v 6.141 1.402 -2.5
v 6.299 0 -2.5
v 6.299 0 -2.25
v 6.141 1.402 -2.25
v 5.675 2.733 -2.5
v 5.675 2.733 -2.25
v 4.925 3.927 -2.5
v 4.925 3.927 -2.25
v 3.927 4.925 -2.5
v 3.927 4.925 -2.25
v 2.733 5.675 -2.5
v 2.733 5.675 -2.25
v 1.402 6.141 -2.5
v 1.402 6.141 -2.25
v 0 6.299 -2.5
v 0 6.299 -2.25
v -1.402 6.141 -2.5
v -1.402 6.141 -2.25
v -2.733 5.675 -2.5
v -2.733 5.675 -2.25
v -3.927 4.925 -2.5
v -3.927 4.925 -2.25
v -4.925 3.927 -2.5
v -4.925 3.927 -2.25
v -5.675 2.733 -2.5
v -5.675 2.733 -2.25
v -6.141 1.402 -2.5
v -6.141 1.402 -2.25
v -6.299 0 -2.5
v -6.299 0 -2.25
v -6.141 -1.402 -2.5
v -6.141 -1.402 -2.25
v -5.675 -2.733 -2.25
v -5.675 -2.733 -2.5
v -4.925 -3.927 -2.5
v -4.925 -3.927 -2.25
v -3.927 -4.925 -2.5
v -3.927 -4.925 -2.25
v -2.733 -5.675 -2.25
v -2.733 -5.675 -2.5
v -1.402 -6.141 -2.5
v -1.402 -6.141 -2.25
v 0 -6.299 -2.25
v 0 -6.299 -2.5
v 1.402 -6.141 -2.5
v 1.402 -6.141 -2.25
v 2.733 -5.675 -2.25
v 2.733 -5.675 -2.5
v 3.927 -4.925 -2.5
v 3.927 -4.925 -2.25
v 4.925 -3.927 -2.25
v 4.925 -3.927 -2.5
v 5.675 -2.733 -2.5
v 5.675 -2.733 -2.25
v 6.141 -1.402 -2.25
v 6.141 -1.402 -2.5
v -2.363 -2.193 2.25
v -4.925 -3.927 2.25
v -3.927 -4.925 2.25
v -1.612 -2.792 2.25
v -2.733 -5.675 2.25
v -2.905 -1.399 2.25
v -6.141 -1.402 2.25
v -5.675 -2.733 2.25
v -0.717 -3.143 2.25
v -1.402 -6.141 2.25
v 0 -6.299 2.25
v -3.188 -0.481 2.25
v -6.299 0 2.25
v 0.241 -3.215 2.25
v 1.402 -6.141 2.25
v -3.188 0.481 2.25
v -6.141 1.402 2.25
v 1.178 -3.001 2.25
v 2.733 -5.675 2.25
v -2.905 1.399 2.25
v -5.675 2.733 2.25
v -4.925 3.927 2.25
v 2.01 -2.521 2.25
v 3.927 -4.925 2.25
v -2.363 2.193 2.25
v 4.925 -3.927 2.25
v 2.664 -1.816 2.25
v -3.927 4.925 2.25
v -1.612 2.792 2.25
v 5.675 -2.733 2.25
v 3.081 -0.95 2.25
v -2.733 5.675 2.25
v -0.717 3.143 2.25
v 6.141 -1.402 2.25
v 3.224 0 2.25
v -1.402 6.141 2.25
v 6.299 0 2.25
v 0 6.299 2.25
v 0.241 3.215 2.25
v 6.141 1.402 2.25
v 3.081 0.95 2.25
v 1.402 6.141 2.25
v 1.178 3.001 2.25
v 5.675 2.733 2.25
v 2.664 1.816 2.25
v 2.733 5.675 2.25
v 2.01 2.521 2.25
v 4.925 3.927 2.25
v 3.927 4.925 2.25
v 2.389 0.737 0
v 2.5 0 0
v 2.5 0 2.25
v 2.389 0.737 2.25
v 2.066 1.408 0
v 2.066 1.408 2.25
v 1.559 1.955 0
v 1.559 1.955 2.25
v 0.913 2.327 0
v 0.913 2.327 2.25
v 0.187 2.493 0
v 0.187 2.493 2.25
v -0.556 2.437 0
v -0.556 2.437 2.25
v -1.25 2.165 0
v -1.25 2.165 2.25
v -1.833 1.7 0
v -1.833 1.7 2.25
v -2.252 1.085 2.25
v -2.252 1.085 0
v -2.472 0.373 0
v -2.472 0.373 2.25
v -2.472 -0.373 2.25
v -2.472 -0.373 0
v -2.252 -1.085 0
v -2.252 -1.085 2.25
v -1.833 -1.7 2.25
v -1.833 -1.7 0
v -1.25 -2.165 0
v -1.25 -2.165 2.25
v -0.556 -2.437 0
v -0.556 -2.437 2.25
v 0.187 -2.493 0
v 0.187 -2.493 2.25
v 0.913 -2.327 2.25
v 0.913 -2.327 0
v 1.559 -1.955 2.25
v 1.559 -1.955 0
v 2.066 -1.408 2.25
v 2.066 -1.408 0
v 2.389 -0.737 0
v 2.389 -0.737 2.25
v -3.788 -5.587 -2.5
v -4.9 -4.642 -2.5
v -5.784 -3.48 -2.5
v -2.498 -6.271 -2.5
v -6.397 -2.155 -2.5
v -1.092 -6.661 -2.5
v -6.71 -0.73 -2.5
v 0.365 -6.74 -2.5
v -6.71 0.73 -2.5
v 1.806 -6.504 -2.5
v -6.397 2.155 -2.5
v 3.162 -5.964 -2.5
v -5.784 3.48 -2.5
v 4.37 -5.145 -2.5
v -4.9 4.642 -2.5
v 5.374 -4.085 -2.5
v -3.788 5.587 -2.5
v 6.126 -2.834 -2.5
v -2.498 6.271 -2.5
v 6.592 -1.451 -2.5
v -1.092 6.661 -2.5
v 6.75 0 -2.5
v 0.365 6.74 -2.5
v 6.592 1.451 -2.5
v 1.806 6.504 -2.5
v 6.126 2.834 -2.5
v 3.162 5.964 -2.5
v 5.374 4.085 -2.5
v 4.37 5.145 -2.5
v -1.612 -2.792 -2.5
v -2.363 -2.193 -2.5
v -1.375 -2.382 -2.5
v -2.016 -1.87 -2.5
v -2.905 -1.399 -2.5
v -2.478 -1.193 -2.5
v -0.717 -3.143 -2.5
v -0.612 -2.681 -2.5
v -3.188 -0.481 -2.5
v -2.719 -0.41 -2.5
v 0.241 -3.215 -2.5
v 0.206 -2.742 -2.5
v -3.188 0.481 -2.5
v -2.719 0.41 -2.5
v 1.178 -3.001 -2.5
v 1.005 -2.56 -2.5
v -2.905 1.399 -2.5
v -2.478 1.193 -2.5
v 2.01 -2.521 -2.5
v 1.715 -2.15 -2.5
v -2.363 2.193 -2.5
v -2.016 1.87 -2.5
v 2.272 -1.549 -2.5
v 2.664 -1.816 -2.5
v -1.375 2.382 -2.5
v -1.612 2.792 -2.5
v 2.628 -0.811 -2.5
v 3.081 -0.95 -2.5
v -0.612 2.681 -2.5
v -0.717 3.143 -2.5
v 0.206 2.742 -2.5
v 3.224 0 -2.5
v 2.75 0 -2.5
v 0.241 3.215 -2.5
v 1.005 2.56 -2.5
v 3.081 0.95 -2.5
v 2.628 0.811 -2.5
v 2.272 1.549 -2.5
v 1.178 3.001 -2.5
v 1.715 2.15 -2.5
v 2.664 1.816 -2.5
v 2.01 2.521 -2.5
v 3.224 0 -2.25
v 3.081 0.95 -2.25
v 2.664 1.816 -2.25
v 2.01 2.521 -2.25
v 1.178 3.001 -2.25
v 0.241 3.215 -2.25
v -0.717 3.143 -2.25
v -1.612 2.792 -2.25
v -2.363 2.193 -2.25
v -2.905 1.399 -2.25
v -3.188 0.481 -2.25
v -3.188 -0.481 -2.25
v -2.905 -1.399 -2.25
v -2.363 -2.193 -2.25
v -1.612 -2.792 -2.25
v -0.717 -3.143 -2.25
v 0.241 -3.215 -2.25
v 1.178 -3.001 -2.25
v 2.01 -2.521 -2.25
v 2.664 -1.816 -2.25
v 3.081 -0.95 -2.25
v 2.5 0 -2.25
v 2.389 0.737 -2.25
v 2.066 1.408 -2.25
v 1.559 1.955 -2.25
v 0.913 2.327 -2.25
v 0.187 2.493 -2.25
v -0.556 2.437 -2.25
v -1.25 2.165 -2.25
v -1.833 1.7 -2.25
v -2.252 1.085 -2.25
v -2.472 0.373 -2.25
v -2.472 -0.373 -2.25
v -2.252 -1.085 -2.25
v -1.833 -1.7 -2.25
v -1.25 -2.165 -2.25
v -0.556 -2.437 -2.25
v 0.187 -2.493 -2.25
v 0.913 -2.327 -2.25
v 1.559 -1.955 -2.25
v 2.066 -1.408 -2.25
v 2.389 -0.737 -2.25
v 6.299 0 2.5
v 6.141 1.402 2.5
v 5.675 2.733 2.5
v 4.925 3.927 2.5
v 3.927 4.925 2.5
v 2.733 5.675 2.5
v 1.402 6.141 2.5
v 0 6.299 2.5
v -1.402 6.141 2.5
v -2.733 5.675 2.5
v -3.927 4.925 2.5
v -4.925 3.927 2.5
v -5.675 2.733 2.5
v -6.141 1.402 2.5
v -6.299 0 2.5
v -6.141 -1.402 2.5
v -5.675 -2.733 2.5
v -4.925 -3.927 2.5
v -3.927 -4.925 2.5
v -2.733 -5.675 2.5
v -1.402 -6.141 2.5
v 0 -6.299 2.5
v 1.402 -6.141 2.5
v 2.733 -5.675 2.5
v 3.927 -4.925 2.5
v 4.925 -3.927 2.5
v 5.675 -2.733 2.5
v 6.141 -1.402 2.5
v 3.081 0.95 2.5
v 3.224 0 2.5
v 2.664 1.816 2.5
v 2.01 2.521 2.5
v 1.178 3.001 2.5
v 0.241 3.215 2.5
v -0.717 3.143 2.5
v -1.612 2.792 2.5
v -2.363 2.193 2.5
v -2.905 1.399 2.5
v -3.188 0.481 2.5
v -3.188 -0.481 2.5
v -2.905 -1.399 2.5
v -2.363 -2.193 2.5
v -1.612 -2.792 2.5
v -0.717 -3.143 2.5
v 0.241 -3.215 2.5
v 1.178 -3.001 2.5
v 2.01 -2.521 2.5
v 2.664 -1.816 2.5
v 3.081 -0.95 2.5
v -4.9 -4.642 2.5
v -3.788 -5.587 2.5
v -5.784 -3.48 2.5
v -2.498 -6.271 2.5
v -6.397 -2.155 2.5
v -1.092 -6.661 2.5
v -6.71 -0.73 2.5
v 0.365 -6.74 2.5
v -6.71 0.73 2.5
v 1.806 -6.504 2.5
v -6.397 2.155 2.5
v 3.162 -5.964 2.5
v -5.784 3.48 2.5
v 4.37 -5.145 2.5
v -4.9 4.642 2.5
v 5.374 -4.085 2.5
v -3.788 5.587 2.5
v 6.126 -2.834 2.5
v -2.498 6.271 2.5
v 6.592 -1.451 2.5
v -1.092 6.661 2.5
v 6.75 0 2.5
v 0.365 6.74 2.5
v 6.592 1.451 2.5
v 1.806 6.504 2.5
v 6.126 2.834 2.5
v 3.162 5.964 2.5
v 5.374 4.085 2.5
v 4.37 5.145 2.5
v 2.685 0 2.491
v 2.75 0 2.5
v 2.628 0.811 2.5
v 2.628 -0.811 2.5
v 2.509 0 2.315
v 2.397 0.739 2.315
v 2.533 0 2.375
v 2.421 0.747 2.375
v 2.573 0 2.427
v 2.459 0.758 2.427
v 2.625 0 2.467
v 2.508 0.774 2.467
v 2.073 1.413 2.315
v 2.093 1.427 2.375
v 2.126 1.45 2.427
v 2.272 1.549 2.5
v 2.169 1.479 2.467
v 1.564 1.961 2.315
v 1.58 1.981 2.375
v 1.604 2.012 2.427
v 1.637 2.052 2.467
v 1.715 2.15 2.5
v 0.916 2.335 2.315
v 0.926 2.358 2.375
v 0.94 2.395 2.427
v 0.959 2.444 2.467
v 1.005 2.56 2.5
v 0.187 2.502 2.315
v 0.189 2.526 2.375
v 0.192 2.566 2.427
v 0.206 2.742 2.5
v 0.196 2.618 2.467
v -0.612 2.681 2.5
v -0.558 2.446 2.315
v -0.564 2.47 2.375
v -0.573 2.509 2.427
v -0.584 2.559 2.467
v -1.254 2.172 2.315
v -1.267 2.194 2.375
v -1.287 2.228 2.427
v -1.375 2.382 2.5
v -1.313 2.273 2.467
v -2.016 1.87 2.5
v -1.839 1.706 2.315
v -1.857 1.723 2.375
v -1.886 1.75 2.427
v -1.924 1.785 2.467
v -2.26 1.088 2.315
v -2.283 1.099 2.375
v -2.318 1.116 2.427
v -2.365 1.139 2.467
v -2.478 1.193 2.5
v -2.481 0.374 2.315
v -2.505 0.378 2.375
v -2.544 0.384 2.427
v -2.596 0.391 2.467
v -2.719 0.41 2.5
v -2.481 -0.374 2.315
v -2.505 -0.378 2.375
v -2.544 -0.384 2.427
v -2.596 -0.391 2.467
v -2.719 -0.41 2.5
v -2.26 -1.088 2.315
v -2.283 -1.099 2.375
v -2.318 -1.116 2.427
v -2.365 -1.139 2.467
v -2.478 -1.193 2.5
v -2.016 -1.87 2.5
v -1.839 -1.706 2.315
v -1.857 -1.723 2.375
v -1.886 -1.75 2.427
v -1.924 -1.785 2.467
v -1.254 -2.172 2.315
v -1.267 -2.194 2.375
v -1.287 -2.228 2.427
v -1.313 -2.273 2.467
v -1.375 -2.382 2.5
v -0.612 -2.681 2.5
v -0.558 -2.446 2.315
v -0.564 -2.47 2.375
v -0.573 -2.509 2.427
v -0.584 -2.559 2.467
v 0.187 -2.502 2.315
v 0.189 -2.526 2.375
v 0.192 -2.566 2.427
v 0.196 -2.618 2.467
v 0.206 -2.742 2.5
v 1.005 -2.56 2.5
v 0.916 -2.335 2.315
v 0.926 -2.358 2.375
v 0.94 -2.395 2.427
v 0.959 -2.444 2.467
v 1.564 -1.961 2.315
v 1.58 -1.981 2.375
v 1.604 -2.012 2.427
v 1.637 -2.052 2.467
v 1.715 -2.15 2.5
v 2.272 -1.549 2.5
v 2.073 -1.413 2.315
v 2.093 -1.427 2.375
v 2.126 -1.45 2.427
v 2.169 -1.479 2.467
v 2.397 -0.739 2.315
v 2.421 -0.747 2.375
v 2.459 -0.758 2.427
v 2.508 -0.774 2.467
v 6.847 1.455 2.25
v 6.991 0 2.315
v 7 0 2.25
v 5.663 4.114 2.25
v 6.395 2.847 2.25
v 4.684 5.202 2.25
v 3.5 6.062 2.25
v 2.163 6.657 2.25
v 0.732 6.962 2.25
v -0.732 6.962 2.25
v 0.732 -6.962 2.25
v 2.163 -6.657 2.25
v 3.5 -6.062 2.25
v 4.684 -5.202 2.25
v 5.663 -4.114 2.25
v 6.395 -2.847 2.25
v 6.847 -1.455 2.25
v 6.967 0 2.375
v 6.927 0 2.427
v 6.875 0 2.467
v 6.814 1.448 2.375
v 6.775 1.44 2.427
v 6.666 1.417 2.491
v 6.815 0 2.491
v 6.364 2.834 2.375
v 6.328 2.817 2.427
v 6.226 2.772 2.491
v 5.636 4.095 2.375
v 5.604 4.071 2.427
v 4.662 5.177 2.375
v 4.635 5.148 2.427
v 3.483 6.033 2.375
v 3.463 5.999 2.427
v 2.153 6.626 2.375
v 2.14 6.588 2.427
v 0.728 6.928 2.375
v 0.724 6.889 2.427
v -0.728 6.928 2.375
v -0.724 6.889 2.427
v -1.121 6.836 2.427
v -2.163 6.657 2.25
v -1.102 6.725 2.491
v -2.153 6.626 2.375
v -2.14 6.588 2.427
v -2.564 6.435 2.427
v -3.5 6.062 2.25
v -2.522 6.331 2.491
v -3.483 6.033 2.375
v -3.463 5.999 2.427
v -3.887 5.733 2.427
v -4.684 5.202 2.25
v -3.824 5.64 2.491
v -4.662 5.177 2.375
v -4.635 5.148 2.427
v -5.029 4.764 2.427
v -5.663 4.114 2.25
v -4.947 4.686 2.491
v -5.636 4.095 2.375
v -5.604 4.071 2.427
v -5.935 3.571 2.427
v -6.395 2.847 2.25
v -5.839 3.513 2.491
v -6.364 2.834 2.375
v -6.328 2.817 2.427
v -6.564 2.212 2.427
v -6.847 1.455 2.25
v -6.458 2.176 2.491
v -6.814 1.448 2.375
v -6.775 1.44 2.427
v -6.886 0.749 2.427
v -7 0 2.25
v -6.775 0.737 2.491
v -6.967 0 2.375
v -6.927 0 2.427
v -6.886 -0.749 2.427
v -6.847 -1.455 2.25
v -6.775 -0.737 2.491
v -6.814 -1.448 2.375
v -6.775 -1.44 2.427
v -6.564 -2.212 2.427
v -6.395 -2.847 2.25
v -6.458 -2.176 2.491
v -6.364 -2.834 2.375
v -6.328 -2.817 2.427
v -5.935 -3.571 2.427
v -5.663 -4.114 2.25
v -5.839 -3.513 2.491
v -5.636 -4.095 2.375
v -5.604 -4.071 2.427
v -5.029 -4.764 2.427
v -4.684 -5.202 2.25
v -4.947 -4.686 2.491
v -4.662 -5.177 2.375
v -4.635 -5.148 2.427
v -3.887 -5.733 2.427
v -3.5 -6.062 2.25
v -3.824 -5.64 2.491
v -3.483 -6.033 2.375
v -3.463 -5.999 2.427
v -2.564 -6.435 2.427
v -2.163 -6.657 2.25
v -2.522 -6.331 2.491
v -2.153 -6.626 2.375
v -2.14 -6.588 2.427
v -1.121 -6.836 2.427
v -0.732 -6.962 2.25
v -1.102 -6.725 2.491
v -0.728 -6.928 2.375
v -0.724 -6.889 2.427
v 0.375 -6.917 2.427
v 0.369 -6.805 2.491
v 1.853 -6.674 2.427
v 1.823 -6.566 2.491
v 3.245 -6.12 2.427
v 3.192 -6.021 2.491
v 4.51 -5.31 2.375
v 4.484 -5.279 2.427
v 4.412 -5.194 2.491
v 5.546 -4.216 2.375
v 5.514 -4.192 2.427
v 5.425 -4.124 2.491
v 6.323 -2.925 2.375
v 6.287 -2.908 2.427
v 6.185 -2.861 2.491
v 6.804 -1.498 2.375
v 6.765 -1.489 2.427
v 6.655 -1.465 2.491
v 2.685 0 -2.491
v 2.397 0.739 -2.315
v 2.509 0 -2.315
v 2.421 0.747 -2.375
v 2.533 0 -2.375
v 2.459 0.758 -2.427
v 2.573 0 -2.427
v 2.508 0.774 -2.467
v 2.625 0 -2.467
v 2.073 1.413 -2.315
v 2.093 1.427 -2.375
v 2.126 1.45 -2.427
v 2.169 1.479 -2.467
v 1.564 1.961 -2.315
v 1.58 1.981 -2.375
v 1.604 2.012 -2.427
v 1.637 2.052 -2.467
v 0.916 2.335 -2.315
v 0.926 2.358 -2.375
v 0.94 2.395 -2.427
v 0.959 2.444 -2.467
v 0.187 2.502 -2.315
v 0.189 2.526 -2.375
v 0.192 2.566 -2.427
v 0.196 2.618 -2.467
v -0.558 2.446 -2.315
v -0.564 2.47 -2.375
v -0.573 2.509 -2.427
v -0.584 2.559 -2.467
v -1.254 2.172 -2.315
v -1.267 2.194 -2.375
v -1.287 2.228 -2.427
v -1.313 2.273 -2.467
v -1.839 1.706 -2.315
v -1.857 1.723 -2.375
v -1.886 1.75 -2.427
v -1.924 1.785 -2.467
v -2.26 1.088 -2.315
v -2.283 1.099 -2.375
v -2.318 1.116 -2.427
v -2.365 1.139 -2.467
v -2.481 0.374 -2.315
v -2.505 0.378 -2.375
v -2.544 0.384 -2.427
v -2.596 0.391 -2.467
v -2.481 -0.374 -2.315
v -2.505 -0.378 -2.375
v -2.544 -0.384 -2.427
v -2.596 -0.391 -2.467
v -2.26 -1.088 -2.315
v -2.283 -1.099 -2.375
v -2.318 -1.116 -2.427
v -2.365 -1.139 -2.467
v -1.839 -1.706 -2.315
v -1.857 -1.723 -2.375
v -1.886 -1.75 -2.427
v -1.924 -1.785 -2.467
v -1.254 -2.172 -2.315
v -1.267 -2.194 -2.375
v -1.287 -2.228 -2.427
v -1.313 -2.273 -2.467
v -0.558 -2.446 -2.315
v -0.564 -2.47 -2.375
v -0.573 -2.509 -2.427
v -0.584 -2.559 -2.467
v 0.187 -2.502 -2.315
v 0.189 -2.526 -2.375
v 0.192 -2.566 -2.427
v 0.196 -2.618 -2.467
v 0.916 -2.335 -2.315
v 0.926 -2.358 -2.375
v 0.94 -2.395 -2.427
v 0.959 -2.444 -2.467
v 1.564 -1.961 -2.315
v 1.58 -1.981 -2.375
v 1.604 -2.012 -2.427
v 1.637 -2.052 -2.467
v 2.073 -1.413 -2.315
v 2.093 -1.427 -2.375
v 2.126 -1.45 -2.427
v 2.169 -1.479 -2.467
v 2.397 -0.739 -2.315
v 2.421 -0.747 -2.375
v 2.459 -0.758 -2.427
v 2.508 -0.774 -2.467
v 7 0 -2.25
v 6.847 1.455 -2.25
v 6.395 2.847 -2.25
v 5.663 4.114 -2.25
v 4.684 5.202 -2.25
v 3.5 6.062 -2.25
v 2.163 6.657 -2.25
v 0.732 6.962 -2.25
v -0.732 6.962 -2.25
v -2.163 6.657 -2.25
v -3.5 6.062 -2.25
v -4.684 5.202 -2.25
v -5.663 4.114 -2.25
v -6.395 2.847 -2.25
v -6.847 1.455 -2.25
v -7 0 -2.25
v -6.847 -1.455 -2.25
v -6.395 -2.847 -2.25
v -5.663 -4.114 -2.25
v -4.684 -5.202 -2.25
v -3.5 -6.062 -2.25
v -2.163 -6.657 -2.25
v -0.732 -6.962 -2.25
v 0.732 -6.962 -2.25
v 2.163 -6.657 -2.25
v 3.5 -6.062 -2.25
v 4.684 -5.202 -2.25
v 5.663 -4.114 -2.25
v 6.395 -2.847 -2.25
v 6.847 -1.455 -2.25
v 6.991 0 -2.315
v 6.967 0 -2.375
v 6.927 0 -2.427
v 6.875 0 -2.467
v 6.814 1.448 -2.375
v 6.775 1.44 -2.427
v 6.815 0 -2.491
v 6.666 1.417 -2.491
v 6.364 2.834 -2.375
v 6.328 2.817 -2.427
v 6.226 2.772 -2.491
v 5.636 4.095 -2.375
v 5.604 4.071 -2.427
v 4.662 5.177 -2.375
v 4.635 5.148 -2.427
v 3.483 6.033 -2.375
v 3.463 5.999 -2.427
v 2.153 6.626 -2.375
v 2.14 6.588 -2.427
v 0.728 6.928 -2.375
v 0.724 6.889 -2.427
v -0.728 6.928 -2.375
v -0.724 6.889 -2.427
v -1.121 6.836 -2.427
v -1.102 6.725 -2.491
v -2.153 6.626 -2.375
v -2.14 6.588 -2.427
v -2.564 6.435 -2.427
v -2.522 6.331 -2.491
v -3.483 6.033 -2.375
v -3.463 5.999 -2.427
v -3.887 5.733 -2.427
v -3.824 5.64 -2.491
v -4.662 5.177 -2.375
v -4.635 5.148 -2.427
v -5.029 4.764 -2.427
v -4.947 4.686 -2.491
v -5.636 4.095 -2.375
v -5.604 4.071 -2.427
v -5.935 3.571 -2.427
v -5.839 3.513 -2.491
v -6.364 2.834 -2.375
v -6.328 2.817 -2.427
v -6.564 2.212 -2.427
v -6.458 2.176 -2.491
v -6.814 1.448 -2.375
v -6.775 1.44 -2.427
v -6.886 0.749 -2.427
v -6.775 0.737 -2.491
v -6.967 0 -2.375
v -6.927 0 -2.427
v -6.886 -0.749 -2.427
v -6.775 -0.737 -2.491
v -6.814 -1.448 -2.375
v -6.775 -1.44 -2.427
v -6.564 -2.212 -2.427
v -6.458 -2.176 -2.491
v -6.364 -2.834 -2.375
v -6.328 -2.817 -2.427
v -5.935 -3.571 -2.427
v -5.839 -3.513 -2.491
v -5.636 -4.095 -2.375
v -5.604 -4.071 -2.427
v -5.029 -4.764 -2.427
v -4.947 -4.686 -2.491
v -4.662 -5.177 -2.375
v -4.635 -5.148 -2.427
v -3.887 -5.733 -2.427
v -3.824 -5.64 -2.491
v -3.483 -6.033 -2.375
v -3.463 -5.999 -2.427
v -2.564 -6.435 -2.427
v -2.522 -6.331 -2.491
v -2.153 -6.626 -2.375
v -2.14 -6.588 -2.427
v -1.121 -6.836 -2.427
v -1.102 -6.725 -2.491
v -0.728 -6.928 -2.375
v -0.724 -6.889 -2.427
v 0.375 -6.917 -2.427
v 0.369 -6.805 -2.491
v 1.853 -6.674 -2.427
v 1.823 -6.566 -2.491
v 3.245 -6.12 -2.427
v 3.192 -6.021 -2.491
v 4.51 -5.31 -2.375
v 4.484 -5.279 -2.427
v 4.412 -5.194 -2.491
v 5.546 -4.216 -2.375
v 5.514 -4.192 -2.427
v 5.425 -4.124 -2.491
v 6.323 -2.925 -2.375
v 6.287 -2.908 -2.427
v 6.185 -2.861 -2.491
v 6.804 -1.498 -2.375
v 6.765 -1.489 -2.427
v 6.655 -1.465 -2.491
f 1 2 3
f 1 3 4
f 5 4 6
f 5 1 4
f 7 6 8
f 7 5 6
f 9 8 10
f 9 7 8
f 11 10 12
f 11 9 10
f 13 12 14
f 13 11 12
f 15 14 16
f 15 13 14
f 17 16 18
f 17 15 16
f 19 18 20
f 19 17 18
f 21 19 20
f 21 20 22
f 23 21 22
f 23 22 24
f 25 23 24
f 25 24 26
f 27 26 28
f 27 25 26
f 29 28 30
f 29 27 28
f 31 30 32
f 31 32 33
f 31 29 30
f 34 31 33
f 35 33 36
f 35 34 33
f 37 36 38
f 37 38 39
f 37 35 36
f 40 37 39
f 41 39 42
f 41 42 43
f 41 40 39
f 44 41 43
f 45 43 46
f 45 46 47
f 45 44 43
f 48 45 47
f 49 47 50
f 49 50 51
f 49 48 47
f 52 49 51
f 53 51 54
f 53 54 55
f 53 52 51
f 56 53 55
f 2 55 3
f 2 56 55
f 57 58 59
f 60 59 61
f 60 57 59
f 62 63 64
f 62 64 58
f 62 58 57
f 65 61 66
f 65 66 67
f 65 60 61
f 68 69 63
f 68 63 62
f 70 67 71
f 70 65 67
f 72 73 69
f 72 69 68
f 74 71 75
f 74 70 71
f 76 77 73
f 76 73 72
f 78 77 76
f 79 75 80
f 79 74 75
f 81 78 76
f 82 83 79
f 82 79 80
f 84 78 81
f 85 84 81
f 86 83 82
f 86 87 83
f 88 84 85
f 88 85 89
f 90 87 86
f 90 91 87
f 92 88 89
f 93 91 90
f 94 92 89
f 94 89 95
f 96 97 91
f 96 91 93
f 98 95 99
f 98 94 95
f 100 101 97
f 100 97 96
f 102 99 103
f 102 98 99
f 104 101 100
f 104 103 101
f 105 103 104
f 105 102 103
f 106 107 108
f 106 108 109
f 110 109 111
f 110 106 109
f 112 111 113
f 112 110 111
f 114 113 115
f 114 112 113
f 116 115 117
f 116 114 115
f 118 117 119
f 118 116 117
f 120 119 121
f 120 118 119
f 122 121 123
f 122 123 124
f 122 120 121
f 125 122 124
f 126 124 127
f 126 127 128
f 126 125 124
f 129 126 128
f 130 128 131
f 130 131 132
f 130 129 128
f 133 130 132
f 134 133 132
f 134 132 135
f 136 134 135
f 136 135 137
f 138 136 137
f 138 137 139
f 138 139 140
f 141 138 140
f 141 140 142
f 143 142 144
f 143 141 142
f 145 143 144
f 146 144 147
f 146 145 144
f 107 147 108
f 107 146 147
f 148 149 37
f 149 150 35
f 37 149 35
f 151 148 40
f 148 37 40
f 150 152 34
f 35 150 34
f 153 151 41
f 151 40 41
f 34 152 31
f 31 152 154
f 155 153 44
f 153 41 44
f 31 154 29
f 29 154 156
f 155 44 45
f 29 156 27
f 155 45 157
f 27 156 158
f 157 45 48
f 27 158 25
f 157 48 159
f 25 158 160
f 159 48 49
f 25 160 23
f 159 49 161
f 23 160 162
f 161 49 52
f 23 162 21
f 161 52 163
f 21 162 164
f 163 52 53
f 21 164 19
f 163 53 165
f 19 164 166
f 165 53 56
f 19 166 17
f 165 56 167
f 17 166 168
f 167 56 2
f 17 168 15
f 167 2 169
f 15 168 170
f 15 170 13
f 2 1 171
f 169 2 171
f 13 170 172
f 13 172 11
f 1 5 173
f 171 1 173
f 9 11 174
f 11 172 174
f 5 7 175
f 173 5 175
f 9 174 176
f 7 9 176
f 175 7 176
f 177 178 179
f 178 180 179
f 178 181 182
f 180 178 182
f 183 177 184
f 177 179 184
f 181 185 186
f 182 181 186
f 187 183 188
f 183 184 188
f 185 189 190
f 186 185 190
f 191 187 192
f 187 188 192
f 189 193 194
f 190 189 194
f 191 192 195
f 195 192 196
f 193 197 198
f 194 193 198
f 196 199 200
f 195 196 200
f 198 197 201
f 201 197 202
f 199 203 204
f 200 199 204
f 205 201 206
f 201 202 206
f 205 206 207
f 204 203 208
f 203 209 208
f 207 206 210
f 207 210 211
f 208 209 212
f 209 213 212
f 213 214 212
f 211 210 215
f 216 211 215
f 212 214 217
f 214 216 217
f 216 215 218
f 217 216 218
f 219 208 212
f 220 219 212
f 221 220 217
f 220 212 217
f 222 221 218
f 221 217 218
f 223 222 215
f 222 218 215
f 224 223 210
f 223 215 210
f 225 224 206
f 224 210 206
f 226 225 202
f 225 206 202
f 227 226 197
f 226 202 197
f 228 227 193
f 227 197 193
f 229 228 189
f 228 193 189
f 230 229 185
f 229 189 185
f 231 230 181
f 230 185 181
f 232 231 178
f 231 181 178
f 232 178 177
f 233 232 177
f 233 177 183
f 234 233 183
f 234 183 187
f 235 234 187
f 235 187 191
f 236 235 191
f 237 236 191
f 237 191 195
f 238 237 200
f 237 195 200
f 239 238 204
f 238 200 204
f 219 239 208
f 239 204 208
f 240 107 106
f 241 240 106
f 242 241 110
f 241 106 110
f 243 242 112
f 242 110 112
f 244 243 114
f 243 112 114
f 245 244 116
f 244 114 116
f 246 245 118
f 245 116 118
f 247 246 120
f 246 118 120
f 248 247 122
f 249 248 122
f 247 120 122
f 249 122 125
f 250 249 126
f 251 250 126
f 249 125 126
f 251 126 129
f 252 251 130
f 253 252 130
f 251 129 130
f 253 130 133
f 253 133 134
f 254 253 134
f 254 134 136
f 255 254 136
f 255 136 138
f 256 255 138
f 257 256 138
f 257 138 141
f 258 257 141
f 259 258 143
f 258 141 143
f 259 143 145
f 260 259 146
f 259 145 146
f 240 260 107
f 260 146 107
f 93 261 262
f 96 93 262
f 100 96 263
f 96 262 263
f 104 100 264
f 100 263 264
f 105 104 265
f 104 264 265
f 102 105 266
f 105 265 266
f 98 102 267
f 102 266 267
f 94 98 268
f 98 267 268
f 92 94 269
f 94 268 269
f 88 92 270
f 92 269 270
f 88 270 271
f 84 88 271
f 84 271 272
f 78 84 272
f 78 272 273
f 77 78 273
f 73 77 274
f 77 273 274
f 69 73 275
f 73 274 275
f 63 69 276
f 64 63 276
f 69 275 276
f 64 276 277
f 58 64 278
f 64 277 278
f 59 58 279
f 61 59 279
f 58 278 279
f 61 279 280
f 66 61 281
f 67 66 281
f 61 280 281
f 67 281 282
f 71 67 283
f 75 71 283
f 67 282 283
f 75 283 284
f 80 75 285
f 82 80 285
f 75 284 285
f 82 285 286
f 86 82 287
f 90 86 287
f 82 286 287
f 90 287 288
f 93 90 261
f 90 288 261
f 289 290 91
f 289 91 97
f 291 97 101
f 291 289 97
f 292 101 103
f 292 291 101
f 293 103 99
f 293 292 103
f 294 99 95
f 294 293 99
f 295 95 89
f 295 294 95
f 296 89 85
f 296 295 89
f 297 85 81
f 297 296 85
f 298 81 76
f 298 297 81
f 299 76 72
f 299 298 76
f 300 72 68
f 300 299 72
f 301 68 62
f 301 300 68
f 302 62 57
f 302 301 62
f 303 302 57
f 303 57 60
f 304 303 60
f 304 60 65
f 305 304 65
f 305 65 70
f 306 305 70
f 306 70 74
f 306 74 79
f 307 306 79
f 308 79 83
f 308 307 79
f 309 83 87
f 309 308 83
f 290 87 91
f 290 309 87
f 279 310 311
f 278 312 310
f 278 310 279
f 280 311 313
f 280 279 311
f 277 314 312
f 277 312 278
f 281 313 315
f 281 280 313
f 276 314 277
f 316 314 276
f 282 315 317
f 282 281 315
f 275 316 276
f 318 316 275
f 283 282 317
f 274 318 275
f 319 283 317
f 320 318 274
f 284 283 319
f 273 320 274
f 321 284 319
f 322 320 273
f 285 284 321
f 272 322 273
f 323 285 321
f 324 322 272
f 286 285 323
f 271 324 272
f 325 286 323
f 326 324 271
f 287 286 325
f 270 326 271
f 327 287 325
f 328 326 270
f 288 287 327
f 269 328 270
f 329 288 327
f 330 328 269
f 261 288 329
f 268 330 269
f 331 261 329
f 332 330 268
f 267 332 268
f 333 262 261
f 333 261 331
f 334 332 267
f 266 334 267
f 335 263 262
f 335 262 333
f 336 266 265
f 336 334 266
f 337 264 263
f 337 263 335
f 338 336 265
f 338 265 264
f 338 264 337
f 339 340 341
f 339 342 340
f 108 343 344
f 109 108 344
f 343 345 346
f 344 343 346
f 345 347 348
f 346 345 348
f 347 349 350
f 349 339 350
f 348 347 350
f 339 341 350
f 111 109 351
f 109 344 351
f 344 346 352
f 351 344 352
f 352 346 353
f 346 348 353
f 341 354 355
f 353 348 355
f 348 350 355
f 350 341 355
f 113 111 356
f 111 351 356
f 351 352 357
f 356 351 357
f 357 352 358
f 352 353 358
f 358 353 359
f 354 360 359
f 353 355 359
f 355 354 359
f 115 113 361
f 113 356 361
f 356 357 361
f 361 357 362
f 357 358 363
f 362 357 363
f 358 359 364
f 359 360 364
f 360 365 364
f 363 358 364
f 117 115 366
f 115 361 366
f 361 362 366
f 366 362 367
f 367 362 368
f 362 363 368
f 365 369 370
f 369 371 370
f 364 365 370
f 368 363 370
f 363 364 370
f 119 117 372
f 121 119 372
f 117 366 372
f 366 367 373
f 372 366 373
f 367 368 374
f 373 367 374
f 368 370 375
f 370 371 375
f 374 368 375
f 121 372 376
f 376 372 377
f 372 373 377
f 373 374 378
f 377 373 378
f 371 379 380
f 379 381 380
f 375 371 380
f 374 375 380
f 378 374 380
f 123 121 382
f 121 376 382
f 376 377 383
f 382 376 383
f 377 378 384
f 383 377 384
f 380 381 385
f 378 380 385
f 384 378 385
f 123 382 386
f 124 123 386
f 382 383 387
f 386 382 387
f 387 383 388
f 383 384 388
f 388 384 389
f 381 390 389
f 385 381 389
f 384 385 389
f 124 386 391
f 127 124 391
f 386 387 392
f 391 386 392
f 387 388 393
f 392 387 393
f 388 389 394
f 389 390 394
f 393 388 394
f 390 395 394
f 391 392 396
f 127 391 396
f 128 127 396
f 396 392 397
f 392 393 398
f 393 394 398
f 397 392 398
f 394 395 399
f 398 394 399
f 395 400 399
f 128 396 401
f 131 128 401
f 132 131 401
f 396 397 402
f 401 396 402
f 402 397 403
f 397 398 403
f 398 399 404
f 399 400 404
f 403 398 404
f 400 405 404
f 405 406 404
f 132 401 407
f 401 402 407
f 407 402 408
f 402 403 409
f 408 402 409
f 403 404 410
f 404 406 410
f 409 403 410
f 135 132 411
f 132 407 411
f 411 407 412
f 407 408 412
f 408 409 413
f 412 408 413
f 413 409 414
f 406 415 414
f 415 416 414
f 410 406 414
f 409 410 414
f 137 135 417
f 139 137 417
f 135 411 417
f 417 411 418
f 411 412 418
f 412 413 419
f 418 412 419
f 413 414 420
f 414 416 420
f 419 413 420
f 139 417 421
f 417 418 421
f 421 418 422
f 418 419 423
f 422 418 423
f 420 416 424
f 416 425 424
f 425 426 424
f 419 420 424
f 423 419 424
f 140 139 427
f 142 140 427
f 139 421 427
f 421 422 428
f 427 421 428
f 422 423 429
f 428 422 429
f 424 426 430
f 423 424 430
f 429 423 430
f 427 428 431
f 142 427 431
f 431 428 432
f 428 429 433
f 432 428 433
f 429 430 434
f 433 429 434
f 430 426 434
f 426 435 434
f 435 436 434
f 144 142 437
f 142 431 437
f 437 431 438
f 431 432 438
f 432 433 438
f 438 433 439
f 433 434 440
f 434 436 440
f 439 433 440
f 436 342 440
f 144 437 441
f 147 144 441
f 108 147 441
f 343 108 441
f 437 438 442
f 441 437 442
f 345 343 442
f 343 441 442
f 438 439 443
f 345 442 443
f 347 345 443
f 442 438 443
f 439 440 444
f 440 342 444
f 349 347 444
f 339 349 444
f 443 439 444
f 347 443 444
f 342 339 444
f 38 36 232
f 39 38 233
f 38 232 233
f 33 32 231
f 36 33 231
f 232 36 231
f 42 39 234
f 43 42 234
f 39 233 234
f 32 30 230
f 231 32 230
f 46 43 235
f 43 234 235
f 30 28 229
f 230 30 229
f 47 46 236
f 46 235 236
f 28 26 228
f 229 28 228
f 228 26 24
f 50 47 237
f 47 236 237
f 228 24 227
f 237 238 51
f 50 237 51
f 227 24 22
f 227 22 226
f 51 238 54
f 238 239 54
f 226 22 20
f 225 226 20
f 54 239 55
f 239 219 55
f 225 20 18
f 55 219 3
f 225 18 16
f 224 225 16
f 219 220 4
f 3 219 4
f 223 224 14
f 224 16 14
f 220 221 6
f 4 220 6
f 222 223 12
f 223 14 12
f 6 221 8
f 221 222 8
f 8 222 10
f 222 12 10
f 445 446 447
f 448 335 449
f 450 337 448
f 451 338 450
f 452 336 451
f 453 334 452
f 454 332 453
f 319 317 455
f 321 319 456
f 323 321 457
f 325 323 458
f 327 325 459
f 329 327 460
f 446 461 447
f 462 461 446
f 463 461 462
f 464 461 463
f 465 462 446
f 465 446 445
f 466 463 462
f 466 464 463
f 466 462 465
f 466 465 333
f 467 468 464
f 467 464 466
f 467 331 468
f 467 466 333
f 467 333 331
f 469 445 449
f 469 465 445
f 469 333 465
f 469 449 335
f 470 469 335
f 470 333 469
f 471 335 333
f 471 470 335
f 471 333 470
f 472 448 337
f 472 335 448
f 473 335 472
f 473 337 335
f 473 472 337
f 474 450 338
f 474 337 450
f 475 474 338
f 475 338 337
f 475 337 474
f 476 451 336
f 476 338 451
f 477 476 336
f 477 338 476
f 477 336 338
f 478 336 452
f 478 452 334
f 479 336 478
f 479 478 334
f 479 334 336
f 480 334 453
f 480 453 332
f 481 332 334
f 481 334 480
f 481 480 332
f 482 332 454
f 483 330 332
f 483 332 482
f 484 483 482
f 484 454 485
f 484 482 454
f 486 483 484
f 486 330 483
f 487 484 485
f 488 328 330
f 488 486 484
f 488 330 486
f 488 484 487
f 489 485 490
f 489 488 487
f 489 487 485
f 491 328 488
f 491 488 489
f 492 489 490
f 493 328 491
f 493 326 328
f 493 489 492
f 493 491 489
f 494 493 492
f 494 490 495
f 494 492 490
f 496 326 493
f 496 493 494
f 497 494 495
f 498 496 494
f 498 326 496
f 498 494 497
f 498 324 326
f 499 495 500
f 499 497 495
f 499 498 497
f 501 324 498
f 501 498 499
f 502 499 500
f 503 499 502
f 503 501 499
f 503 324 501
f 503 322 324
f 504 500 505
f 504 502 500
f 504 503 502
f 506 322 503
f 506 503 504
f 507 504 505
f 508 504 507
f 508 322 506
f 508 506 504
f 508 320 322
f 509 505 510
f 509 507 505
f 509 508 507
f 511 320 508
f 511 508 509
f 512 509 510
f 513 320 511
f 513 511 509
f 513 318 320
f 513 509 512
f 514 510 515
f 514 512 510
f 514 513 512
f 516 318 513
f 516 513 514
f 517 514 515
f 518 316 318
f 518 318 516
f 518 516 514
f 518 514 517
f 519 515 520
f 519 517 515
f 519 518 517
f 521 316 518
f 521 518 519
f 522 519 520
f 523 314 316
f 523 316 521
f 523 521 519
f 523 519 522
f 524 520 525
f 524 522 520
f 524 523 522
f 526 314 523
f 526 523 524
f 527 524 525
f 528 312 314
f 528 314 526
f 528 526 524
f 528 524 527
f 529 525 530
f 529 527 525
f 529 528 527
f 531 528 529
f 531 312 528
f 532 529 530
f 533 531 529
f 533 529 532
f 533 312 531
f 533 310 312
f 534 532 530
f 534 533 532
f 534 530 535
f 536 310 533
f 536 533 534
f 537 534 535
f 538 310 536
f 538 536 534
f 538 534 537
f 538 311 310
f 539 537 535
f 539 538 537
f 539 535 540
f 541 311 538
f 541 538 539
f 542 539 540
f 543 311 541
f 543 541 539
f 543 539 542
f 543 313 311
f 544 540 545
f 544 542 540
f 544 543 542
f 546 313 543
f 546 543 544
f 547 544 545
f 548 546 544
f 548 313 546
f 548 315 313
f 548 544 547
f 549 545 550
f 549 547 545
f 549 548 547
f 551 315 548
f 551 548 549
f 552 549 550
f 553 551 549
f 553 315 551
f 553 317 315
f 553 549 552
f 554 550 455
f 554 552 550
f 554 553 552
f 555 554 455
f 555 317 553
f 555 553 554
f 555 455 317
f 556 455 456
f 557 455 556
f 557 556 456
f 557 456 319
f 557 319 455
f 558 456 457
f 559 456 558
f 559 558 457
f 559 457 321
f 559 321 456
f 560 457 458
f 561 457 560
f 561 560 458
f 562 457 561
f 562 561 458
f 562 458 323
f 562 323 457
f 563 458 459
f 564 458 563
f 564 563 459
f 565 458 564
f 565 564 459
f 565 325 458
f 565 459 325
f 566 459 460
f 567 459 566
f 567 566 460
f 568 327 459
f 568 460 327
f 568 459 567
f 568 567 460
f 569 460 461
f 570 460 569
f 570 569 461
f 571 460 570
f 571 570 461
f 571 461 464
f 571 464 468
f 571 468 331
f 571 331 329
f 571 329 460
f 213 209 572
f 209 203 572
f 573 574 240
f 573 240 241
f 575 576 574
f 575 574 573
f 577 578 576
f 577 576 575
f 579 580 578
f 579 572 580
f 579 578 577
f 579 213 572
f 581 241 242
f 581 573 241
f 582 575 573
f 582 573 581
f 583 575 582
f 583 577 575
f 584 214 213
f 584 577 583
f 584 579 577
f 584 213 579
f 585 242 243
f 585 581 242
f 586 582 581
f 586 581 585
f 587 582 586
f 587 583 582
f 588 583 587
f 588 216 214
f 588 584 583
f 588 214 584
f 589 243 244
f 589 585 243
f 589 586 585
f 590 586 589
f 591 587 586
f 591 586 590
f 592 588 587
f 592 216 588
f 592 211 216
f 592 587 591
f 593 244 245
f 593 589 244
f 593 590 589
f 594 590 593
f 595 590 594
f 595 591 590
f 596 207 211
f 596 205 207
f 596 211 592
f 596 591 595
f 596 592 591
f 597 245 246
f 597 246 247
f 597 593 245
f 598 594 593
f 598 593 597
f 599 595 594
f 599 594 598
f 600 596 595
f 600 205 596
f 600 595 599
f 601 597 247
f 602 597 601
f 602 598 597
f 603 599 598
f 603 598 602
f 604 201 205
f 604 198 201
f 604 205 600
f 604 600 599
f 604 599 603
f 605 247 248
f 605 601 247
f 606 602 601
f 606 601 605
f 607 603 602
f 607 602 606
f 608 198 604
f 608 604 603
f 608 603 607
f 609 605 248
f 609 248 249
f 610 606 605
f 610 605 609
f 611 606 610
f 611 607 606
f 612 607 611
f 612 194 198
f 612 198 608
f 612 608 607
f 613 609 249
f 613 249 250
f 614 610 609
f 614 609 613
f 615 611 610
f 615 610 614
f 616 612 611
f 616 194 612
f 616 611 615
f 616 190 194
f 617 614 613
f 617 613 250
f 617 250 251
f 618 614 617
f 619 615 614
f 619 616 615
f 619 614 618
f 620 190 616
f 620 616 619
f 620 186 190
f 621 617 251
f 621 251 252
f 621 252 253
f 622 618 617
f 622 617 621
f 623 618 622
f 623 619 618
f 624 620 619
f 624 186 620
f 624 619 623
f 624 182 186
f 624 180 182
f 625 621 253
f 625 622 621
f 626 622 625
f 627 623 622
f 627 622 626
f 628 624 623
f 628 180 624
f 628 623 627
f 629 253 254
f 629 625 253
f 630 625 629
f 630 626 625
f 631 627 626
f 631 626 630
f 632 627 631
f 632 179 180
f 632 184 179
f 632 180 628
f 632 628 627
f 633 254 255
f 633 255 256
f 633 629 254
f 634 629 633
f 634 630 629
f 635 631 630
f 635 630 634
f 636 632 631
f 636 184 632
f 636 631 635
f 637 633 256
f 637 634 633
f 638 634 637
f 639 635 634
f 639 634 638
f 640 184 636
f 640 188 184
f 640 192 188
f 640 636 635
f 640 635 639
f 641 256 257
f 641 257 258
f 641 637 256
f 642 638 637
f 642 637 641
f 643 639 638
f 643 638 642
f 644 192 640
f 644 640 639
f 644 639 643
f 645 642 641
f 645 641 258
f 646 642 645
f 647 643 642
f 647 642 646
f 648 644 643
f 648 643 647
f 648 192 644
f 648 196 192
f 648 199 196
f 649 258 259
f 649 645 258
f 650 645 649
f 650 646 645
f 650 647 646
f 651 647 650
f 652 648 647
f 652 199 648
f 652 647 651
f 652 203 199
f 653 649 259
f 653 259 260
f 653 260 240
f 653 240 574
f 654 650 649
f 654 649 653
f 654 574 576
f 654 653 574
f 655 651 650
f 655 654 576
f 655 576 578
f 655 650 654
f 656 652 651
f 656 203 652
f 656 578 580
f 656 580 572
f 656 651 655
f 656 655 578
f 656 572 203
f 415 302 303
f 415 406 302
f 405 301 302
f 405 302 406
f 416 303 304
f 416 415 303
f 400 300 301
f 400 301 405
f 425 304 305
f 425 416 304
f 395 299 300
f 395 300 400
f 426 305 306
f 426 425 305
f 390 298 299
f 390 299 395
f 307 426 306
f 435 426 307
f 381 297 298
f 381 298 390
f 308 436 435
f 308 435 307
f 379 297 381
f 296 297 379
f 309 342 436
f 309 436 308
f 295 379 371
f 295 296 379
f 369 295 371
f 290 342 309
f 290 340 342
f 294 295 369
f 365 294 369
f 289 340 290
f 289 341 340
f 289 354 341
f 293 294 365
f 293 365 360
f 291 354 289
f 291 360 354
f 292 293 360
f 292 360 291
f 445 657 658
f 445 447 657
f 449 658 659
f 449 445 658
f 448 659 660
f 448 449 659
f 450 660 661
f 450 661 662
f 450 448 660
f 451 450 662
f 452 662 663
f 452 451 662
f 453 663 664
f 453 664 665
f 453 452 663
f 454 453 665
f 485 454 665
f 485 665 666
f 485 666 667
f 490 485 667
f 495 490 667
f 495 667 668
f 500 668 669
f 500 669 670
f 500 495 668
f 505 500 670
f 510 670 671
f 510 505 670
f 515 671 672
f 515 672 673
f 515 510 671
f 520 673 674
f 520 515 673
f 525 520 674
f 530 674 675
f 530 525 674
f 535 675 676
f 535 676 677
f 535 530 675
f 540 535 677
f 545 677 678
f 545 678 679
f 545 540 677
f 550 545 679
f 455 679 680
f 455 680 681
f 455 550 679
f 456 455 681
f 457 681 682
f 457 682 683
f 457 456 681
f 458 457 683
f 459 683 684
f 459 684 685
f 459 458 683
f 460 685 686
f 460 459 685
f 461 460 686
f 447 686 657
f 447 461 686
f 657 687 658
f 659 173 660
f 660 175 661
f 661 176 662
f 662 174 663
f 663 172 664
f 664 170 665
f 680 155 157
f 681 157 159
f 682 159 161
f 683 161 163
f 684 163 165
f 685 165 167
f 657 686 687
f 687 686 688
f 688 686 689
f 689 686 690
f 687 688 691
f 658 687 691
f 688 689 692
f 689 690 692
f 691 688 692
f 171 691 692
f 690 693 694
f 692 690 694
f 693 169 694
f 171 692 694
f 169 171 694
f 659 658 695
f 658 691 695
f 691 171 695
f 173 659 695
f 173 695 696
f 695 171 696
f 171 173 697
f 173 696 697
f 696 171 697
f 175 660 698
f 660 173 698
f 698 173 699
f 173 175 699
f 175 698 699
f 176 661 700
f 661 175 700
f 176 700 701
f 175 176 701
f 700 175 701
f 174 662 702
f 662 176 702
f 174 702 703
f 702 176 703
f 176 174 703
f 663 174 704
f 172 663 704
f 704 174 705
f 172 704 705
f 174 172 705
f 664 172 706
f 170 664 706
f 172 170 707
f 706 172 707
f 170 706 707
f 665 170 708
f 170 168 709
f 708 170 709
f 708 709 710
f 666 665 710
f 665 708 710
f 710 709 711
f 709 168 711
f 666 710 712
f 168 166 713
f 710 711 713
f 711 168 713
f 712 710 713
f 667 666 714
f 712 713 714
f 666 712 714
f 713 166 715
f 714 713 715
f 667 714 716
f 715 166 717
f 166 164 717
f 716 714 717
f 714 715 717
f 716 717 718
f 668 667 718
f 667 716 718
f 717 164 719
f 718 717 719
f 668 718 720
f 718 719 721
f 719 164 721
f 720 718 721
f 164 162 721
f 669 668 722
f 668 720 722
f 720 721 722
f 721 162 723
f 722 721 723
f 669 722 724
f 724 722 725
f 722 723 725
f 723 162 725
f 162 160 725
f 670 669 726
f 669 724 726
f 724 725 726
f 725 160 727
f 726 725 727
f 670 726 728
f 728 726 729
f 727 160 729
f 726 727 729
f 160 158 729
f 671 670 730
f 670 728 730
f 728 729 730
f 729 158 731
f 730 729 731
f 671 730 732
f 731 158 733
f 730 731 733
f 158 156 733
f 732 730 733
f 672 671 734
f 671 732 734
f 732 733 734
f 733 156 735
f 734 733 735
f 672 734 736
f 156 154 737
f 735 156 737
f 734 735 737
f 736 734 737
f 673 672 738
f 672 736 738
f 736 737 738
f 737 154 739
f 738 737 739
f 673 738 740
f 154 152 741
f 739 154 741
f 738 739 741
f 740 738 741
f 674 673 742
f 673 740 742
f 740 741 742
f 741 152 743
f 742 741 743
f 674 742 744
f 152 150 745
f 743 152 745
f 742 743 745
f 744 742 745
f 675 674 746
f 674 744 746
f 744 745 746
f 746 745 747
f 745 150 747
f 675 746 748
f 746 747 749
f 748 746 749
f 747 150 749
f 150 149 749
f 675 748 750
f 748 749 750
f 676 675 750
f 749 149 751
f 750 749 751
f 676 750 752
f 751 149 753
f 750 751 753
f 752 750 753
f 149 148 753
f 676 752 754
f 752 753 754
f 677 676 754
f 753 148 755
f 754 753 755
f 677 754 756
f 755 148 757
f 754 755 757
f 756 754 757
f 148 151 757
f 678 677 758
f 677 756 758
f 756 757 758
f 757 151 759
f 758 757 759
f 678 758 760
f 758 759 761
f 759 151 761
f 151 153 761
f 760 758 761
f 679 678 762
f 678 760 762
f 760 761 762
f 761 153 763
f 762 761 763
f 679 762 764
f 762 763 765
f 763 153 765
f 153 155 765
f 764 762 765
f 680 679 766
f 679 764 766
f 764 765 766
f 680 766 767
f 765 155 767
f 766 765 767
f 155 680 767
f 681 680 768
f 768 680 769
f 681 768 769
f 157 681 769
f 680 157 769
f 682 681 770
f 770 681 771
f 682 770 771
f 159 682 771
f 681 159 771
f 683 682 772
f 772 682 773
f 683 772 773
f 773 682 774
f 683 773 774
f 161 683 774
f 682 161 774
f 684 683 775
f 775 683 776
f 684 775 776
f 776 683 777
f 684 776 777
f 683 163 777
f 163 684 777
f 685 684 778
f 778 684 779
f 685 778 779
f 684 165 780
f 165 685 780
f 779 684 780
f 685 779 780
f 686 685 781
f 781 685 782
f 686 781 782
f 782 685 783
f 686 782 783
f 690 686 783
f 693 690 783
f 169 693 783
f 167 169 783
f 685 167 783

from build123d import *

# Parameters (mm, degrees)
F0_R     = 7
F0_R_2   = 2.5
F1_DEPTH = 2.5
F2_R     = 6.298938
F2_R_2   = 3.223977
F3_DEPTH = 0.25
F4_R     = 0.25


with BuildPart() as f1:
    # F0 (on Top) → F1 (new body)
    with BuildSketch(Plane.XY):
        Circle(F0_R)
        Circle(F0_R_2, mode=Mode.SUBTRACT)
    extrude(amount=F1_DEPTH)

    # F2 (on face) → F3 (cut)
    with BuildSketch(Plane.XY.offset(2.5)):
        Circle(F2_R)
        Circle(F2_R_2, mode=Mode.SUBTRACT)
    extrude(amount=-F3_DEPTH, mode=Mode.SUBTRACT)

    # F4
    f4_edges = [f1.edges().sort_by_distance(p)[0] for p in [
        (-7, 0, 2.5),
        (-2.5, 0, 2.5),
    ]]
    fillet(f4_edges, radius=F4_R)

    # F5: F1 across face


with BuildPart() as f1_1:
    add(f1.part)
    add(f1.part.mirror(Plane(origin=(0, 0, 0), x_dir=(1, 0, 0), z_dir=(0, 0, -1))))


solid = f1_1.part
